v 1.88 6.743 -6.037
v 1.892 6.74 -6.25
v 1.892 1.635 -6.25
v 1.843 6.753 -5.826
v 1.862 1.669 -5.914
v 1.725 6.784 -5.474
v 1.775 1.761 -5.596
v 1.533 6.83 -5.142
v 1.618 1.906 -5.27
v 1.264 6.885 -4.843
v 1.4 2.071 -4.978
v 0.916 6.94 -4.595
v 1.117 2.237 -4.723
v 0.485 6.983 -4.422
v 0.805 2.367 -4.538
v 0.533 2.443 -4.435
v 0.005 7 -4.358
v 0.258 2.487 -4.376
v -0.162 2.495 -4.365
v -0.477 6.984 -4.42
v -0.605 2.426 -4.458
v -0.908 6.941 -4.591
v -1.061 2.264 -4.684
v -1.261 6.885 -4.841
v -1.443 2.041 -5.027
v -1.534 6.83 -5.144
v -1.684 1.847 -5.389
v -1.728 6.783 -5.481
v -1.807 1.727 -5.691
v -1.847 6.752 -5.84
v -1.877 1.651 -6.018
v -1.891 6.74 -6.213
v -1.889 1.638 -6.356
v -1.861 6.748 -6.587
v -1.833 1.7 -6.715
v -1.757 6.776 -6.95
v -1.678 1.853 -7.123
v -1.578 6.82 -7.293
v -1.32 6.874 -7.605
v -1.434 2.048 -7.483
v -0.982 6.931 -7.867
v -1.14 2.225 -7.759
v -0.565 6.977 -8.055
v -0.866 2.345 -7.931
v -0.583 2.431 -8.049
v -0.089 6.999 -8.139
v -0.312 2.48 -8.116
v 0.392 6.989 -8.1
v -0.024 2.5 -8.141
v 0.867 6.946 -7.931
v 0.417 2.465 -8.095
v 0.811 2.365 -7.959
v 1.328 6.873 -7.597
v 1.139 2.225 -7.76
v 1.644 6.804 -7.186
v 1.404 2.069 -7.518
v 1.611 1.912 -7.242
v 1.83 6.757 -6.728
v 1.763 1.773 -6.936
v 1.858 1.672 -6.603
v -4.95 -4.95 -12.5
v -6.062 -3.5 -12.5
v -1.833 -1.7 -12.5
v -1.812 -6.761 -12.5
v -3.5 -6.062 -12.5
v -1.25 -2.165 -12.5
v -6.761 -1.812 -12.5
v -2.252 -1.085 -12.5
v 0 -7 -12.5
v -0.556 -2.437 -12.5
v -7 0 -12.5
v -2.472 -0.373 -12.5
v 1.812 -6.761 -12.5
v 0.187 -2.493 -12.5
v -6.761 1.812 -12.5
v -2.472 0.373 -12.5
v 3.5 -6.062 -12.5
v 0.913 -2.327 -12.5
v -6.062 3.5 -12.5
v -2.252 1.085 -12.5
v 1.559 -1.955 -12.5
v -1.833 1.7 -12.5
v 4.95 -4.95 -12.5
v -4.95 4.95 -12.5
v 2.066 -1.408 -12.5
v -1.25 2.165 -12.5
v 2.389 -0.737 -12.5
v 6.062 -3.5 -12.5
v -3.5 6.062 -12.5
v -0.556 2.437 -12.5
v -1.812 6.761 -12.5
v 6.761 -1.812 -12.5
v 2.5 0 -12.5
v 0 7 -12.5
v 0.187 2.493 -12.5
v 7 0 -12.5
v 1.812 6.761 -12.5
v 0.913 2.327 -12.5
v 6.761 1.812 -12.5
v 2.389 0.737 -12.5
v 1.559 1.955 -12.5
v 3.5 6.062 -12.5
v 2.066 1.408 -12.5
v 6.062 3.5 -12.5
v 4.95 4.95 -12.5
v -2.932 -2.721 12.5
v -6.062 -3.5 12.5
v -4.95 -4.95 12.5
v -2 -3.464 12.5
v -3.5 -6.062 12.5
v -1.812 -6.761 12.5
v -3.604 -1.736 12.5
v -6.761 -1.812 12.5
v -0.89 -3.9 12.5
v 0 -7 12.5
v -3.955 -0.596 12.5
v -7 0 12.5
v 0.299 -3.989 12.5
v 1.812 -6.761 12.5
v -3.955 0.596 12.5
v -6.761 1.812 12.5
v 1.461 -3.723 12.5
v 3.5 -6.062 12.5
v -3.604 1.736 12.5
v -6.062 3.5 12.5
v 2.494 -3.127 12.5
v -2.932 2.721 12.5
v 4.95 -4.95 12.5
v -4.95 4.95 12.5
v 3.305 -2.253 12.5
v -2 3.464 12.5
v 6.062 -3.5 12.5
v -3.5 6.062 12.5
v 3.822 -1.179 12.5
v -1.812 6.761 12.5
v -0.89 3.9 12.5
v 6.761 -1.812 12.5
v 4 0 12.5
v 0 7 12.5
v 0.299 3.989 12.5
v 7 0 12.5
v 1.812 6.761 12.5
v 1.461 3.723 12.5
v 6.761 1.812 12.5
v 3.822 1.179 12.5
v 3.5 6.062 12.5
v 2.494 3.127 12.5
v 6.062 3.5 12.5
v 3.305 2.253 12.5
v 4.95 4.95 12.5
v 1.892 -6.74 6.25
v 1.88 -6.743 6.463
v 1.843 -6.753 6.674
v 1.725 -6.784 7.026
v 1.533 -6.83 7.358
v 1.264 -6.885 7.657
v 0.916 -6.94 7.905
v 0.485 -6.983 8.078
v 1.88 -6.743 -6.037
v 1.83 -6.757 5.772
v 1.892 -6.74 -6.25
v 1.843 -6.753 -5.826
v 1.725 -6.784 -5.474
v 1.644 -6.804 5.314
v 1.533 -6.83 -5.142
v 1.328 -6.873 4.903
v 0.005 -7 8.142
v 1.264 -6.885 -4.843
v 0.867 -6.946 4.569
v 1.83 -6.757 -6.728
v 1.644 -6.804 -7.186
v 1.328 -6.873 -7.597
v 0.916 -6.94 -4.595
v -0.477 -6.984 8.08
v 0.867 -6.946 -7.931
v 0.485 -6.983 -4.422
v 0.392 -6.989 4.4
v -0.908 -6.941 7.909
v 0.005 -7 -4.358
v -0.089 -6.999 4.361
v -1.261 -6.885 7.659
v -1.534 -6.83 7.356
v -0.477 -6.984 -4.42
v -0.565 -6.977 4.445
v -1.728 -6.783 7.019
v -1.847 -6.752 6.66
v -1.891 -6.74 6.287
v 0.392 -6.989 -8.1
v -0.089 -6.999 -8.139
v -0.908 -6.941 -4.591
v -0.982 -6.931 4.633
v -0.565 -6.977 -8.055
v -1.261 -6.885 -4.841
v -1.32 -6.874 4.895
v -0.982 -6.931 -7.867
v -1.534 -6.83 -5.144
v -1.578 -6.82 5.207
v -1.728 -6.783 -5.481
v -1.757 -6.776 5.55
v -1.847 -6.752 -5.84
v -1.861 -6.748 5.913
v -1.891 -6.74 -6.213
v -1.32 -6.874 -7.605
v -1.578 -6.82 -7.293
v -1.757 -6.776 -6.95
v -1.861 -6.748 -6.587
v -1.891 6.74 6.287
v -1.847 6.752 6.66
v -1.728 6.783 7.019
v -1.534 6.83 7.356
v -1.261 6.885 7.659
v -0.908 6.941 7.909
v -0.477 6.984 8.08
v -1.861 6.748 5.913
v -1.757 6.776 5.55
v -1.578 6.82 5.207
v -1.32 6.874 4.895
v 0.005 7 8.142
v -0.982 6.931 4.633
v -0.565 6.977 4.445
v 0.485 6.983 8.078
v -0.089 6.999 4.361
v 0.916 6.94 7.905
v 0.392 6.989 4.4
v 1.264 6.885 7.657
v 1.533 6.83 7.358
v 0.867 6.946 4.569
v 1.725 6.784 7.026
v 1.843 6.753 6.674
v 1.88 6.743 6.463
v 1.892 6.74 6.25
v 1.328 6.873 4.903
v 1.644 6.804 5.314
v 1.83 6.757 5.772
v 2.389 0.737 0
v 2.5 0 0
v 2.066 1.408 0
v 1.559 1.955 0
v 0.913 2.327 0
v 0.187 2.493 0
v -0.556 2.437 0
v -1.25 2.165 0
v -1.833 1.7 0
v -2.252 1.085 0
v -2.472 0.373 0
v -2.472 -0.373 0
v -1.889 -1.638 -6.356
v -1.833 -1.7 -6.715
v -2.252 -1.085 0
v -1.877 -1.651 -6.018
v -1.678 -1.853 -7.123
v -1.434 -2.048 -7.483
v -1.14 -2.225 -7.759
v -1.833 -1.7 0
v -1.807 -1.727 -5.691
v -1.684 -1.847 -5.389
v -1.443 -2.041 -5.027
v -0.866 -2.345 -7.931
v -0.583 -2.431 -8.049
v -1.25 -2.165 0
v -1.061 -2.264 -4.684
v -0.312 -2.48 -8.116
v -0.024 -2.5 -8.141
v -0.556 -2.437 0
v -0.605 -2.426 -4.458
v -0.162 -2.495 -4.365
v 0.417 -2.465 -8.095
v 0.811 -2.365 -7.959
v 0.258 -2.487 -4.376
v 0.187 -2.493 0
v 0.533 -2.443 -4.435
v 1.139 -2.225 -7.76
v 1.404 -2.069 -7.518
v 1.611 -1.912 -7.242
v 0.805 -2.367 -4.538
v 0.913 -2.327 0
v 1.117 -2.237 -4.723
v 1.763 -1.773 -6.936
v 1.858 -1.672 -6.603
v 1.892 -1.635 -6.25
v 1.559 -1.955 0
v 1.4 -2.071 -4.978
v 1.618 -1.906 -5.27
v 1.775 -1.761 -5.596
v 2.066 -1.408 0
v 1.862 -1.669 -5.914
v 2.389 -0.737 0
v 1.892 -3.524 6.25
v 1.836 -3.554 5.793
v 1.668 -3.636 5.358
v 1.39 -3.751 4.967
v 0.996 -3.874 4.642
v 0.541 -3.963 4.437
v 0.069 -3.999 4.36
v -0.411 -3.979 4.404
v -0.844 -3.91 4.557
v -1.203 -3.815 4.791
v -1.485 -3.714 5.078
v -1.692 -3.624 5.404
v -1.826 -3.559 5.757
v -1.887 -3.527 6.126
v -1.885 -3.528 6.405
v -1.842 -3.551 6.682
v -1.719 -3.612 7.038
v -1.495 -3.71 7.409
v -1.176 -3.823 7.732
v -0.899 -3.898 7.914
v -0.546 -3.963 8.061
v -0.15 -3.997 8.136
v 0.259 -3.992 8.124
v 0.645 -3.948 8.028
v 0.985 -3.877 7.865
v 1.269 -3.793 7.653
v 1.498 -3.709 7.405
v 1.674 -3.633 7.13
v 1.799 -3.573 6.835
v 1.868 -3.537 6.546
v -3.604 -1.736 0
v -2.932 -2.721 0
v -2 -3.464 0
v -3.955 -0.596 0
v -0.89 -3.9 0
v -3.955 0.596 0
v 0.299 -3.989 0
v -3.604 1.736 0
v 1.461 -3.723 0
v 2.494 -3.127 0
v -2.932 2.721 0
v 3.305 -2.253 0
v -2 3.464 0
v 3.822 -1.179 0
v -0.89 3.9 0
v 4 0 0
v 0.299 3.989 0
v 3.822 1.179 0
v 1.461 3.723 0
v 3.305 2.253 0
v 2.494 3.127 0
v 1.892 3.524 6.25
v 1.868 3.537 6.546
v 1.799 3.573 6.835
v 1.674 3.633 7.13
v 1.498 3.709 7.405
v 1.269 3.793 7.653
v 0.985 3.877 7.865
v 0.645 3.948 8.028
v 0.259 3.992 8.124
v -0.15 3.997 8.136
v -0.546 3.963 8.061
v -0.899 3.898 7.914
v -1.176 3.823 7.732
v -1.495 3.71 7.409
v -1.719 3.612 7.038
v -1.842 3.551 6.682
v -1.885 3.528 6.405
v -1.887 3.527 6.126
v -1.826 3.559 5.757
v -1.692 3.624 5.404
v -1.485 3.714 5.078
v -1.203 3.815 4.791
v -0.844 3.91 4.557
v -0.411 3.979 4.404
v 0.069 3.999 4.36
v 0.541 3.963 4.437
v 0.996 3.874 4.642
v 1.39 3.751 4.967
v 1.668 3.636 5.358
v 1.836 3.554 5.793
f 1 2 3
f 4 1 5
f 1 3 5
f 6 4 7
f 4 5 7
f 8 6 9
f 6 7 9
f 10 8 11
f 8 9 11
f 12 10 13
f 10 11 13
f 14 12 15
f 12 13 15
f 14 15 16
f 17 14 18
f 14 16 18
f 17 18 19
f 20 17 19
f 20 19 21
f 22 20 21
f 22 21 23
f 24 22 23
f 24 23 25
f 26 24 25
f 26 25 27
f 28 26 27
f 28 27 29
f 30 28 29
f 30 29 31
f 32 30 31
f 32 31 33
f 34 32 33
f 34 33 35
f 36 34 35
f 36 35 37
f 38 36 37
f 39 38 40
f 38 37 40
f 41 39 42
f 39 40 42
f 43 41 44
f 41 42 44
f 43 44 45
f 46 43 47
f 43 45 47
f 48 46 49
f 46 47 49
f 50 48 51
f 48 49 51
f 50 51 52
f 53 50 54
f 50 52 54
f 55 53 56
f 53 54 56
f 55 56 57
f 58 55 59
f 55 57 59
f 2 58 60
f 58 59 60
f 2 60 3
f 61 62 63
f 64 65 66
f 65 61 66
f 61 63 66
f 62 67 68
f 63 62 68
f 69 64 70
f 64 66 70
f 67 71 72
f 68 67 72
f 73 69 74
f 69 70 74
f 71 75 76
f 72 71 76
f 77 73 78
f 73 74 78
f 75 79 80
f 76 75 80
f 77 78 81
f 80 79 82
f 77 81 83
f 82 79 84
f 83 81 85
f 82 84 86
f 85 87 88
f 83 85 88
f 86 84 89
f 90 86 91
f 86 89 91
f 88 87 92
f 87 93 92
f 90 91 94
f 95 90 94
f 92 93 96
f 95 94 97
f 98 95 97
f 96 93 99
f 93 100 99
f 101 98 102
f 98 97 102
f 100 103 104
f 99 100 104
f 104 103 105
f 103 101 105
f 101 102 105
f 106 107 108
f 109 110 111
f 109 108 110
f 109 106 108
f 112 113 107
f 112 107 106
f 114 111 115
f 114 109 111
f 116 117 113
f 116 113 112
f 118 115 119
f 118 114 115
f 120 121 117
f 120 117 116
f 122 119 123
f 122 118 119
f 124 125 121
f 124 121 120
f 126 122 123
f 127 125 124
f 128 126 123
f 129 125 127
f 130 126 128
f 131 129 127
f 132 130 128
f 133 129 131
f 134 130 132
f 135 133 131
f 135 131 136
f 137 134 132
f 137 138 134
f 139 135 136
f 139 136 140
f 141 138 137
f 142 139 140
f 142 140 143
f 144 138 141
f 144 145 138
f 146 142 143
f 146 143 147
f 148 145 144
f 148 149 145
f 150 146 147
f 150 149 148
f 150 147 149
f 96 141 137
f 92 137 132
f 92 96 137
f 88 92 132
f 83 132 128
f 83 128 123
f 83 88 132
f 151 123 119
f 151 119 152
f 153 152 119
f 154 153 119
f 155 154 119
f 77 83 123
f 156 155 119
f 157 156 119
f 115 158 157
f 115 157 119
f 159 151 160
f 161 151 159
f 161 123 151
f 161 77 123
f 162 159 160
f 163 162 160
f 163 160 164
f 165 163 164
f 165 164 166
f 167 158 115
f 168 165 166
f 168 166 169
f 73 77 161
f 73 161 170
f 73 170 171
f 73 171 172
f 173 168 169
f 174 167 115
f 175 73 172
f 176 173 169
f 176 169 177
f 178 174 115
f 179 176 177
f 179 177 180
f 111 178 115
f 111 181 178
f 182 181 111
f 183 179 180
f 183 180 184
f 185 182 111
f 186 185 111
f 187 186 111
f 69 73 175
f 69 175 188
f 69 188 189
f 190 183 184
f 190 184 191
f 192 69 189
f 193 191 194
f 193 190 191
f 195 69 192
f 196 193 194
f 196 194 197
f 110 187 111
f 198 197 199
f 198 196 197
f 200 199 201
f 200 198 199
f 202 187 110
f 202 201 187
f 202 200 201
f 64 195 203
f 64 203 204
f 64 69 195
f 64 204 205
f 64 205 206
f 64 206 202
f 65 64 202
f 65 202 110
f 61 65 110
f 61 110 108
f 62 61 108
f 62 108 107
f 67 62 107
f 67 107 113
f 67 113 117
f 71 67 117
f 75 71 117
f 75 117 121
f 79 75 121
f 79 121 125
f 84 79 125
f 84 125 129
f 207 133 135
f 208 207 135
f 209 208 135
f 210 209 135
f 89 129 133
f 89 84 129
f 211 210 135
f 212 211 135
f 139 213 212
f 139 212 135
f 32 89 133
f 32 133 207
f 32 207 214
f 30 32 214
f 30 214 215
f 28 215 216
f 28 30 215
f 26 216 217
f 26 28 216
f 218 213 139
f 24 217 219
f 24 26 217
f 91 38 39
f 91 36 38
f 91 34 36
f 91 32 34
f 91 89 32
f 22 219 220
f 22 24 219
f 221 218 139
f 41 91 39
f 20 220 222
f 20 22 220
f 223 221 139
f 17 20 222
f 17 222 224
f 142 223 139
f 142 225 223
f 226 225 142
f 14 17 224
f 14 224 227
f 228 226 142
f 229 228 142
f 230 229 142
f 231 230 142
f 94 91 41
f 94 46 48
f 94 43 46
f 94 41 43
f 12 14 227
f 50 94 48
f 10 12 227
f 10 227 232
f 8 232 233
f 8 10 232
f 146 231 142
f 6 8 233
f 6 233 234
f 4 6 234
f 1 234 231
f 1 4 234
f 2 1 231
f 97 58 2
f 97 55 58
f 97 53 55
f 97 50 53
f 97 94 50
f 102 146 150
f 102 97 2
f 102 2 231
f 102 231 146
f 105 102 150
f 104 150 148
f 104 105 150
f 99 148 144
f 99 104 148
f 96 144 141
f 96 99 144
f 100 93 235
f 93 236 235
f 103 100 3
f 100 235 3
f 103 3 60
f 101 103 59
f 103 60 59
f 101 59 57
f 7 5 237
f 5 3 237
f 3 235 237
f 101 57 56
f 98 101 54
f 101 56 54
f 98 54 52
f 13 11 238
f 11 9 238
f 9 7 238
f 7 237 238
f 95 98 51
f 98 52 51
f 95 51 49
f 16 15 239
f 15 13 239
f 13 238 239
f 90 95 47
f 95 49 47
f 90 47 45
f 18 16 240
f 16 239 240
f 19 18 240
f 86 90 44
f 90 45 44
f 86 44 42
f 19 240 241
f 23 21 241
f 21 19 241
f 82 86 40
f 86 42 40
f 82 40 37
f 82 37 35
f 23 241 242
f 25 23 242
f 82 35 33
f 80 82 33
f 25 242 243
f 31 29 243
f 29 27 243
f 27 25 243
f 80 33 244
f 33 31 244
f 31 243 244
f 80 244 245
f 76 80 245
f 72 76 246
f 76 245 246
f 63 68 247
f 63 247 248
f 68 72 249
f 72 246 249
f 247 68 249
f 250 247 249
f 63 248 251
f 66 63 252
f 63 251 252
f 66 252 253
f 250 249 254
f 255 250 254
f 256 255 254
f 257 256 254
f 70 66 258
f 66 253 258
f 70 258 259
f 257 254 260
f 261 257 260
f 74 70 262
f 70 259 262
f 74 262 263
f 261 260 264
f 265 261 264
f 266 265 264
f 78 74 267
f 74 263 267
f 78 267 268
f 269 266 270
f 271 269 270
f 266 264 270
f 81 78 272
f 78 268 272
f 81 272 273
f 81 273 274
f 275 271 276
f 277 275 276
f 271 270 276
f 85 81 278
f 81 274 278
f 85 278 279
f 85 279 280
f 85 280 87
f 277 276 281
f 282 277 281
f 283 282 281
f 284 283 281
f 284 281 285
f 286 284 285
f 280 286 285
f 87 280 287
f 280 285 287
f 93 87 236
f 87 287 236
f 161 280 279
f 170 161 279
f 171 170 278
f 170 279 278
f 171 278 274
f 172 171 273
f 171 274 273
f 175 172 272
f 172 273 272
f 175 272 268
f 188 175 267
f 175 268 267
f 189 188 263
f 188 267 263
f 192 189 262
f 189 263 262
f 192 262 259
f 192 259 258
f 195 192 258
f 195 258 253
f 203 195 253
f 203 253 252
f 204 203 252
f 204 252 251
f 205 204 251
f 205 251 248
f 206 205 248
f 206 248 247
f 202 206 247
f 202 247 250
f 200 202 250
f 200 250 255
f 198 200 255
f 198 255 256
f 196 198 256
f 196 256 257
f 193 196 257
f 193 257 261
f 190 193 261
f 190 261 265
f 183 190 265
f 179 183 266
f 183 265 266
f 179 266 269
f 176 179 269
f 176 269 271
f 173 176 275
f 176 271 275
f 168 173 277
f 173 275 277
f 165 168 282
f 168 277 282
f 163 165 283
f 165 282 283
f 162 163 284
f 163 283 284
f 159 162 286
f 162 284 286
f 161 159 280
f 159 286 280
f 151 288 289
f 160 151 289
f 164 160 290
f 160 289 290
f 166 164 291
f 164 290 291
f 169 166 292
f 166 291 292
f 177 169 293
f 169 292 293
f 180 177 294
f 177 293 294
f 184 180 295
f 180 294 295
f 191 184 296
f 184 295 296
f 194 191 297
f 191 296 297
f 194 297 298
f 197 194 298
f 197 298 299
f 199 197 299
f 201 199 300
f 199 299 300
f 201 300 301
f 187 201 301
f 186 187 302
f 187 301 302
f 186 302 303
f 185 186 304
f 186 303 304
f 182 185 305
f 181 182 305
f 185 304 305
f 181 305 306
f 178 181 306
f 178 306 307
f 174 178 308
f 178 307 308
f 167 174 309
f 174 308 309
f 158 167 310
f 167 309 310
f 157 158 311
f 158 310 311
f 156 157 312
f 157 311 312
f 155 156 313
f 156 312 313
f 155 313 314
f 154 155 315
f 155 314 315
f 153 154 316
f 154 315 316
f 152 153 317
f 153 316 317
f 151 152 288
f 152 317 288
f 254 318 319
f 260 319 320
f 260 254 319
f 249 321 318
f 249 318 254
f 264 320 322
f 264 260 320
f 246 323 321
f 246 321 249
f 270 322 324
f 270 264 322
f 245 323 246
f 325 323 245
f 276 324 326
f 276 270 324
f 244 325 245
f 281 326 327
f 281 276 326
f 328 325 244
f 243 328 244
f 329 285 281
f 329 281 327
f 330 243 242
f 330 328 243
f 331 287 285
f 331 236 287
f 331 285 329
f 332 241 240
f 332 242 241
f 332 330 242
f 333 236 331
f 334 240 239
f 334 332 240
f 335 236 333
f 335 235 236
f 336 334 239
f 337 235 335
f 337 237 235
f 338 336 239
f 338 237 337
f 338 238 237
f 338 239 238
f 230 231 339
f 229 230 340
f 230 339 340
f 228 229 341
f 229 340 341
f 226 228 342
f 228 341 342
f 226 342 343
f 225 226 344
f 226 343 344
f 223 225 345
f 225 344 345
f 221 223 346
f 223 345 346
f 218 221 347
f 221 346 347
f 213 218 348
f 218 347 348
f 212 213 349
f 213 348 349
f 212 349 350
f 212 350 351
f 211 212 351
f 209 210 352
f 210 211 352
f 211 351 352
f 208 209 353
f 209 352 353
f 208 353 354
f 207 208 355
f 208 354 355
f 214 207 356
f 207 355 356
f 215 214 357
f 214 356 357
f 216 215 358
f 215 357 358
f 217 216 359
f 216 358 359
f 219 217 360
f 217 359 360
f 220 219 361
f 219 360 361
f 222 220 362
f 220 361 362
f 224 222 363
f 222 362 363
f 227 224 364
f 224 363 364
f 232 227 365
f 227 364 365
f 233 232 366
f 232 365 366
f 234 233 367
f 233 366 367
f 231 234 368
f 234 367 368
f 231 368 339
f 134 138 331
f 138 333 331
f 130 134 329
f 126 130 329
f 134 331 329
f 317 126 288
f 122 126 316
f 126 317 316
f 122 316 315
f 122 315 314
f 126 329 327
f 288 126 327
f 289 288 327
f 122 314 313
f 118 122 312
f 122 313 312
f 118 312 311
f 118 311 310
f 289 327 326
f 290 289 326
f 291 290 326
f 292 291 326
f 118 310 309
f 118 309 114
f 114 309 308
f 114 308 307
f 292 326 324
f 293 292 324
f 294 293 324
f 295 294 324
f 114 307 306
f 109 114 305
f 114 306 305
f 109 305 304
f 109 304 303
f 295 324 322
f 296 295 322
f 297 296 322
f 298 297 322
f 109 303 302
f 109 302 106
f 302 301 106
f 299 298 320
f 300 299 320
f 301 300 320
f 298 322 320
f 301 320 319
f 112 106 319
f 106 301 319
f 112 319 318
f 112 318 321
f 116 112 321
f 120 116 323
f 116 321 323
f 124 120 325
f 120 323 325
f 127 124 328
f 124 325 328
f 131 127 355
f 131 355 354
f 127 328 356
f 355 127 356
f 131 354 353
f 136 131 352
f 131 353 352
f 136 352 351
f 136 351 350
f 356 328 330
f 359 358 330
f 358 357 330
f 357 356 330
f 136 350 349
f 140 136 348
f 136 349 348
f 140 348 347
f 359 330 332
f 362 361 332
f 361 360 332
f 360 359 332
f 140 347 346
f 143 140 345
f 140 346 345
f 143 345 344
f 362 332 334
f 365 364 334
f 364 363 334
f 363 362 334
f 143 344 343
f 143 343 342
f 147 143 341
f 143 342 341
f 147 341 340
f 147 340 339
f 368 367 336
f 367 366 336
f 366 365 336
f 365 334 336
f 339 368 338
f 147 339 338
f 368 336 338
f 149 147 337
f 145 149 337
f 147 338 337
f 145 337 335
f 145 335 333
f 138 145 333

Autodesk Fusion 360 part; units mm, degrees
sketch "Sketch1" plane through (0, 0, 0) normal (0, 0, 1) x (1, 0, 0)
  circle A0 centre (0, 0) radius 2.5
  circle A1 centre (0, 0) radius 4
  circle A2 centre (0, 0) radius 7
  dimension "d1" = 5
  dimension "d2" = 8
  dimension "d3" = 14
extrude "Extrude1" add sketch "Sketch1" along normal blind 12.5 contours A2
extrude "Extrude2" add sketch "Sketch1" against normal blind 12.5 contours A1 | A2
sketch "Sketch2" plane through (0, 0, 0) normal (0, 1, 0) x (1, 0, 0)
  line L0 (7, 12.5) -> (-7, 12.5)
  line L1 (-7, -12.5) -> (7, -12.5)
  line L2 (0, 12.5) -> (0, 6.25)
  circle A0 centre (0, 6.25) radius 2.25
  line L3 (1.75, 0) -> (22.5, 0)
  circle A1 centre (0, -6.25) radius 2.25
  dimension "d8" = 6.25
  dimension "d9" = 4.5
extrude "Extrude3" cut sketch "Sketch2" along normal through all and the other way through all
thread "Thread1" "ISO Metric profile 4.5 M4.5x0.75 6H" major diameter 4.6131 minor diameter 3.7831 pitch 0.75 angle 60 resizes the face on face at (1.4853, 5.7997, 4.5599) on face at (0.8019, 5.4291, -8.3523) on face at (0.8297, -5.4199, -8.3414) on face at (1.4853, -5.7997, 4.5599)
